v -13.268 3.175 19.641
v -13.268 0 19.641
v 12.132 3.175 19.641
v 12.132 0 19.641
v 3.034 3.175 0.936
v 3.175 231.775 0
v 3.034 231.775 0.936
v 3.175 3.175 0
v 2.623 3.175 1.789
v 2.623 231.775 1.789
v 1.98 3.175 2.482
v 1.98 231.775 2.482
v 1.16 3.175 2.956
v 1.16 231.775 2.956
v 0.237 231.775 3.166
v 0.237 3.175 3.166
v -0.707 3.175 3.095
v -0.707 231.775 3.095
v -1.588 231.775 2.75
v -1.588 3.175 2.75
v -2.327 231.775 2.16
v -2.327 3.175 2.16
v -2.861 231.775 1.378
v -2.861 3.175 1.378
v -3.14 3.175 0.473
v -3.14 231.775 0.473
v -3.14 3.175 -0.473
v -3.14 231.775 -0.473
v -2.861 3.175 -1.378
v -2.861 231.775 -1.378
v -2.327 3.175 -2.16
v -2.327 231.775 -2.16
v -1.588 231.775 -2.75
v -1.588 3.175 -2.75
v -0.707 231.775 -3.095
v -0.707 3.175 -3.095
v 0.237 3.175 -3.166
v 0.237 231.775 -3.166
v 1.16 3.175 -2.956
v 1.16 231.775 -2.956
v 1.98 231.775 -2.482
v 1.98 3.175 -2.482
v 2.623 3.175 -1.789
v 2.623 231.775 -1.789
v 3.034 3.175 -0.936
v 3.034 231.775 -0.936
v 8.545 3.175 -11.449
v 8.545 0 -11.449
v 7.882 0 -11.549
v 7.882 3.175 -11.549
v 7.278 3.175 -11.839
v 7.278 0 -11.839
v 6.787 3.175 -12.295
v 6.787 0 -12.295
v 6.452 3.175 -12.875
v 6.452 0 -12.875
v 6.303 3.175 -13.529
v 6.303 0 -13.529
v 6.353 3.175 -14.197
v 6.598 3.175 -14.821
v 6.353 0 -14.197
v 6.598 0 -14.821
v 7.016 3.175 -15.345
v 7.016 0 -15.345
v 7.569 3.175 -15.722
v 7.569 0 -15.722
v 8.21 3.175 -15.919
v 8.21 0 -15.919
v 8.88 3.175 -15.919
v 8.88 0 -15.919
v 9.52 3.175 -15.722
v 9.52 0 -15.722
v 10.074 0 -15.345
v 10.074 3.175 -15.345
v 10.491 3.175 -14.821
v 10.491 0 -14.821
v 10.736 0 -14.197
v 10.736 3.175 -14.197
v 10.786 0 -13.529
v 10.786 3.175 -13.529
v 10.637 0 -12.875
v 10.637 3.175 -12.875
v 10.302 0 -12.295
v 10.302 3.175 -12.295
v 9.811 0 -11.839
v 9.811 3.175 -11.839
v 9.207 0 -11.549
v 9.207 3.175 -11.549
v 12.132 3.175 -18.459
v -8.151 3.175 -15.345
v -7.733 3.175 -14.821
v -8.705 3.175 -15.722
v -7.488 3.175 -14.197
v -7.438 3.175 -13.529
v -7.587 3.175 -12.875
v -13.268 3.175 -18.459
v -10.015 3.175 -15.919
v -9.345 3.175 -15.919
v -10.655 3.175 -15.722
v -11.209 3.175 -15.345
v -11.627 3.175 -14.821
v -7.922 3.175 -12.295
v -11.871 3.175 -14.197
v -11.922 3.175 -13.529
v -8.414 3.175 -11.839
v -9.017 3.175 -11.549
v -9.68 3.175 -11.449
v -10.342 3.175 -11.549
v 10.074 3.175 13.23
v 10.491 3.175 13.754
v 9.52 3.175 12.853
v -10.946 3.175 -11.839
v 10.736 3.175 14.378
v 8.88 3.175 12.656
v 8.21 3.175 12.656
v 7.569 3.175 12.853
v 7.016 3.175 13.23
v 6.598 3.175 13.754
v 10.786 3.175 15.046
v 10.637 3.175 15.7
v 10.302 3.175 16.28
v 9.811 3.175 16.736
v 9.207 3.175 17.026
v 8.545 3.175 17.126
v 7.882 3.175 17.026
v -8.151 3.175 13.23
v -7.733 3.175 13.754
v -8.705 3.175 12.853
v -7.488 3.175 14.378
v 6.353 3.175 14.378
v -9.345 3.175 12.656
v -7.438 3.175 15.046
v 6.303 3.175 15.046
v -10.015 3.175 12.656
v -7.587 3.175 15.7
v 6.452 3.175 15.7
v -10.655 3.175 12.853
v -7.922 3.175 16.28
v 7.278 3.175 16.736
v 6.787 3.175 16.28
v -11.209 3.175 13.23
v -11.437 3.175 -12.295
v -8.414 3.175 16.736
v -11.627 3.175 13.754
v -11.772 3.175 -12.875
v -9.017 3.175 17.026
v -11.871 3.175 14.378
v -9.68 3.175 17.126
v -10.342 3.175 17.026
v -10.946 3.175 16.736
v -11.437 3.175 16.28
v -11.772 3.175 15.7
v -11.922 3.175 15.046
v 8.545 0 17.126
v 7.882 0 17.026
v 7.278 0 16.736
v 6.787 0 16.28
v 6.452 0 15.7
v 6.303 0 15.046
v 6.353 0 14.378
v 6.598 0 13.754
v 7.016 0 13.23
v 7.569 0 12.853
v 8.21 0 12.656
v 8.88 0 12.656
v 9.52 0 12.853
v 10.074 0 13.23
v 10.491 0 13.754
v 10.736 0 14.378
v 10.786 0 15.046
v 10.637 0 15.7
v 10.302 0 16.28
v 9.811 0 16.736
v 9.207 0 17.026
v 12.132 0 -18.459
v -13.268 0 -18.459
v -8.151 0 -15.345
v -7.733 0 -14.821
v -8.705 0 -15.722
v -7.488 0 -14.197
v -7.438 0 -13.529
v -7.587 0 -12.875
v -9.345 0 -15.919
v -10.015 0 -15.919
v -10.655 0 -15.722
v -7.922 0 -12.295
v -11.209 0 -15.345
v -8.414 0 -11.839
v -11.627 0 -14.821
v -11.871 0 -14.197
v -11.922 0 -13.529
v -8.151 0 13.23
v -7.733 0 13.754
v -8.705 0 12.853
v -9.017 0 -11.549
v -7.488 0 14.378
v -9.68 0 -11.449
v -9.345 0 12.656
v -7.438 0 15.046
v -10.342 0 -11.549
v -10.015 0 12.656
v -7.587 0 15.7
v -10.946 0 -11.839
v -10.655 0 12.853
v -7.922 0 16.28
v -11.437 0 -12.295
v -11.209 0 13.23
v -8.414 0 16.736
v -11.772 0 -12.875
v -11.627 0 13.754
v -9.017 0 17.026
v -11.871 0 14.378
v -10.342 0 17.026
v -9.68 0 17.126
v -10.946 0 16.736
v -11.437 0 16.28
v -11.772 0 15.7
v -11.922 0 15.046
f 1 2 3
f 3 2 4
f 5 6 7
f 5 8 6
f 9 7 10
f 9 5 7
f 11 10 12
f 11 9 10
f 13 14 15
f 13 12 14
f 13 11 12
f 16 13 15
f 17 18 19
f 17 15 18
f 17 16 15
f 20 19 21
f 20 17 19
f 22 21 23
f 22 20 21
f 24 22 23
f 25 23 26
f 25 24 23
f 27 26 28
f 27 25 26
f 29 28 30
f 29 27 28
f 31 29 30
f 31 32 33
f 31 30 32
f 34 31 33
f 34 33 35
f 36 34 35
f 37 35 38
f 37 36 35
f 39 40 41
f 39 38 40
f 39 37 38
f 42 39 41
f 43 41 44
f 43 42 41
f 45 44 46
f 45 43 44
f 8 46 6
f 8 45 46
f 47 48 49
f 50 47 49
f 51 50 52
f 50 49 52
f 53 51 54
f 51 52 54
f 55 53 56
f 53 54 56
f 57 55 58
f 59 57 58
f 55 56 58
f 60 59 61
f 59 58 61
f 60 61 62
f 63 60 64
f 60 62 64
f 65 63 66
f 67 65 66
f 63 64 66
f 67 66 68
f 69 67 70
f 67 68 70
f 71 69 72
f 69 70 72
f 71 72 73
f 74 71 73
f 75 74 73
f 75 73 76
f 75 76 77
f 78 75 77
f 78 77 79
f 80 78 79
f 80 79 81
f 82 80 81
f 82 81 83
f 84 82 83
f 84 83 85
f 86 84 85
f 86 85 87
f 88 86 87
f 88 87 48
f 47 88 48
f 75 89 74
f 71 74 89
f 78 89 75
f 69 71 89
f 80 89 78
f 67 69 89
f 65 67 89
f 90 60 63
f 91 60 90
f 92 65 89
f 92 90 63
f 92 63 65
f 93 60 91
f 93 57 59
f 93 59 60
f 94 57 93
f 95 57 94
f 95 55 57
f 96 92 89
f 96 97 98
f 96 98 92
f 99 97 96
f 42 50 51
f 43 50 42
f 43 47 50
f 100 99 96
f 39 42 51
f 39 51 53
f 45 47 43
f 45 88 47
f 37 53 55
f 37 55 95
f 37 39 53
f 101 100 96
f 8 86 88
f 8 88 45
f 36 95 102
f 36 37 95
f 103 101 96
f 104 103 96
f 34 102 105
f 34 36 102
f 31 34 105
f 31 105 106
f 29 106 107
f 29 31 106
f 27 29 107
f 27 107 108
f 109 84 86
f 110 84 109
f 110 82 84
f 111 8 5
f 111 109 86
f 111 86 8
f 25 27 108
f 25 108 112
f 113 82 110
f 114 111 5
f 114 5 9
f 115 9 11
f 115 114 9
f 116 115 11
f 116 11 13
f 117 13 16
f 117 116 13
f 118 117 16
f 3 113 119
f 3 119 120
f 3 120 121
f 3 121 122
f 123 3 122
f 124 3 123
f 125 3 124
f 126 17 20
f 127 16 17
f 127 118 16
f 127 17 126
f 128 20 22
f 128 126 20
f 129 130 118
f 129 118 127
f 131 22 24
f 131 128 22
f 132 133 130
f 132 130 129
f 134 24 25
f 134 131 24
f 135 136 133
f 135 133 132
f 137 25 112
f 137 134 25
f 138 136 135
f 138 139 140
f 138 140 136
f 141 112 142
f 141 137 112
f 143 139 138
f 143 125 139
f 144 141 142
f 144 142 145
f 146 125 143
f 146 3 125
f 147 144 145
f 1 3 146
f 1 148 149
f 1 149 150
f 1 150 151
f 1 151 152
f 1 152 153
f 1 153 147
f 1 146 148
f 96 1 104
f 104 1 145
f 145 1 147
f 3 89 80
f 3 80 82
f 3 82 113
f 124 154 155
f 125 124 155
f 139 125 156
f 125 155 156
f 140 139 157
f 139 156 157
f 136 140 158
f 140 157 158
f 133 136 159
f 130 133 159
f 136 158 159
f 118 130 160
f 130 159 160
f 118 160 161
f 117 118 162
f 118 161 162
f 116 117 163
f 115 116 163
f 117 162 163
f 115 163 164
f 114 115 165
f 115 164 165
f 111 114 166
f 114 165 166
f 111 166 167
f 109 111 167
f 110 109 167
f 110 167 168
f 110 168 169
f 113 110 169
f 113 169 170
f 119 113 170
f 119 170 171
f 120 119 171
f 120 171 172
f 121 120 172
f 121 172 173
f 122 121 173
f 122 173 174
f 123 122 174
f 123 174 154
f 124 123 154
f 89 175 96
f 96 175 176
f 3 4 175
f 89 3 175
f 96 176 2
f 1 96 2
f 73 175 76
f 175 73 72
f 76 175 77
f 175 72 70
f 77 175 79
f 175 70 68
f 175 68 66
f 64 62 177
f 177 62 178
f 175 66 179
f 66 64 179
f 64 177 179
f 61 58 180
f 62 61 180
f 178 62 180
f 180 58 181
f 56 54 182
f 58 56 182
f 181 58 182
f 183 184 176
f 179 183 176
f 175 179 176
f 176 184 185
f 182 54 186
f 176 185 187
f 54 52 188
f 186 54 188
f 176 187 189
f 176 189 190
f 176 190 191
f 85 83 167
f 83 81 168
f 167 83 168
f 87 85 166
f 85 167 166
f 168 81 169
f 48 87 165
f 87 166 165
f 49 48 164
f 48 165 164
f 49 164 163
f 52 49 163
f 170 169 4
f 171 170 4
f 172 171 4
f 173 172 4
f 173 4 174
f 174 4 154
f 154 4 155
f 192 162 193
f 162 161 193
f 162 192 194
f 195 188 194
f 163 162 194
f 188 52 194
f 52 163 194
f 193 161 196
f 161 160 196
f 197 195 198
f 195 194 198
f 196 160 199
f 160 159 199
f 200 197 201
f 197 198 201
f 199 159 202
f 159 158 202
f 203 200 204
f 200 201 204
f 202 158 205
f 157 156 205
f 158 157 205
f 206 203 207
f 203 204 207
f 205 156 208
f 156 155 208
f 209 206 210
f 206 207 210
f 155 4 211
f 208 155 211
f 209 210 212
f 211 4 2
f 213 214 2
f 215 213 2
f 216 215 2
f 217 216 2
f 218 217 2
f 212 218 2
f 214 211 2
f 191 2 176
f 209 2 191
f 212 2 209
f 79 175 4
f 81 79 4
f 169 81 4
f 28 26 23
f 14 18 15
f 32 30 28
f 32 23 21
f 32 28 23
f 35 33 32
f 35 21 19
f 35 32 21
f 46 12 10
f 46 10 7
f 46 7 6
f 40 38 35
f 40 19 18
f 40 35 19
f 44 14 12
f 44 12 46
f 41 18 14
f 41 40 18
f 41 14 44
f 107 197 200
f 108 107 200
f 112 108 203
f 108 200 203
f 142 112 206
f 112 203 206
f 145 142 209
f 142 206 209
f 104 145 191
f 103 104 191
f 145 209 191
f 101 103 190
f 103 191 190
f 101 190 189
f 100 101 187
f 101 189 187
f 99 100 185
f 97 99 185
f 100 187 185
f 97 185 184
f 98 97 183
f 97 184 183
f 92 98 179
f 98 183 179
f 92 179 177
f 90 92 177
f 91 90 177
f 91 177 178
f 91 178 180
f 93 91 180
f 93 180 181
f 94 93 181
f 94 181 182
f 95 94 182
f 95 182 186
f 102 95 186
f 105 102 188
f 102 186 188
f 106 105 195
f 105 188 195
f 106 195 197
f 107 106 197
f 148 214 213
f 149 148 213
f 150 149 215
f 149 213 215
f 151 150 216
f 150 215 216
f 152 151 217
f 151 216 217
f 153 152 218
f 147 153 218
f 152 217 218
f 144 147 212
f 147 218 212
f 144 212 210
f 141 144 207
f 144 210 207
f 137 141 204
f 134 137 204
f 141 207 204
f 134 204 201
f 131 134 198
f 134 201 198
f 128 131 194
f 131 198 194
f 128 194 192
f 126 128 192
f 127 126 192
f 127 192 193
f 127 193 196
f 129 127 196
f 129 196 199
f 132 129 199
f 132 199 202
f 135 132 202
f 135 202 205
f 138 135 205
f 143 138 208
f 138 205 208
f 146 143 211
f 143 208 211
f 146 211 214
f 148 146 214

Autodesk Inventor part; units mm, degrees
ref_plane "YZ Plane" through (0, 0, 0) normal (1, 0, 0) x (0, 1, 0)
ref_plane "XZ Plane" through (0, 0, 0) normal (0, 1, 0) x (-1, 0, 0)
ref_plane "XY Plane" through (0, 0, 0) normal (0, 0, 1) x (1, 0, 0)
sketch "Sketch1" plane through (0, 0, 0) normal (0, 1, 0) x (-1, 0, 0)
  line L0 (13.2677, 19.6408) -> (-12.1323, 19.6408)
  line L1 (-12.1323, 19.6408) -> (-12.1323, -18.4592)
  line L2 (-12.1323, -18.4592) -> (13.2677, -18.4592)
  line L3 (13.2677, -18.4592) -> (13.2677, 19.6408)
  point P0 (0, 0)
  dimension "d0" = 25.4
  dimension "d1" = 38.1
extrude "Extrusion1" add sketch "Sketch1" along normal blind 3.175
hole "Hole1" at (-9.6799, 3.175, 14.8783) direction (0, -1, 0) diameter 4.4958 depth 3.175 clearance for "Flat Head Machine Screw (82)" size "#8" standard "Ansi Unified Screw Threads"
hole "Hole2" at (8.5446, 3.175, 14.8783) direction (0, -1, 0) diameter 4.4958 depth 3.175 clearance for "Flat Head Machine Screw (82)" size "#8" standard "Ansi Unified Screw Threads"
hole "Hole3" at (-9.6799, 3.175, -13.6967) direction (0, -1, 0) diameter 4.4958 depth 3.175 clearance for "Flat Head Machine Screw (82)" size "#8" standard "Ansi Unified Screw Threads"
hole "Hole4" at (8.5446, 3.175, -13.6967) direction (0, -1, 0) diameter 4.4958 depth 3.175 clearance for "Flat Head Machine Screw (82)" size "#8" standard "Ansi Unified Screw Threads"
sketch "Sketch2" plane through (0, 3.175, 0) normal (0, 1, 0) x (1, 0, 0)
  circle A0 centre (0, 0) radius 3.175
  dimension "d58" = 6.35
extrude "Extrusion2" add sketch "Sketch2" along normal blind 304.8
sketch "Sketch3" plane through (0, 0, 0) normal (1, 0, 0) x (0, 1, 0)
  point P0 (0, 0)
sketch "Sketch4" plane through (0, 307.975, 0) normal (0, 1, 0) x (1, 0, 0)
  circle A0 centre (0, 0) radius 3.175 projected
extrude "Extrusion3" add sketch "Sketch4" along normal blind 63.5
sketch "Sketch5" plane through (0, 0, 0) normal (1, 0, 0) x (0, 1, 0)
  point P0 (0, 0)
sketch "Sketch6" plane through (0, 371.475, 0) normal (0, 1, 0) x (1, 0, 0)
  circle A0 centre (0, 0) radius 3.175 projected
extrude "Extrusion4" cut sketch "Sketch6" against normal blind 139.7
properties part number "rotatable rod table"
